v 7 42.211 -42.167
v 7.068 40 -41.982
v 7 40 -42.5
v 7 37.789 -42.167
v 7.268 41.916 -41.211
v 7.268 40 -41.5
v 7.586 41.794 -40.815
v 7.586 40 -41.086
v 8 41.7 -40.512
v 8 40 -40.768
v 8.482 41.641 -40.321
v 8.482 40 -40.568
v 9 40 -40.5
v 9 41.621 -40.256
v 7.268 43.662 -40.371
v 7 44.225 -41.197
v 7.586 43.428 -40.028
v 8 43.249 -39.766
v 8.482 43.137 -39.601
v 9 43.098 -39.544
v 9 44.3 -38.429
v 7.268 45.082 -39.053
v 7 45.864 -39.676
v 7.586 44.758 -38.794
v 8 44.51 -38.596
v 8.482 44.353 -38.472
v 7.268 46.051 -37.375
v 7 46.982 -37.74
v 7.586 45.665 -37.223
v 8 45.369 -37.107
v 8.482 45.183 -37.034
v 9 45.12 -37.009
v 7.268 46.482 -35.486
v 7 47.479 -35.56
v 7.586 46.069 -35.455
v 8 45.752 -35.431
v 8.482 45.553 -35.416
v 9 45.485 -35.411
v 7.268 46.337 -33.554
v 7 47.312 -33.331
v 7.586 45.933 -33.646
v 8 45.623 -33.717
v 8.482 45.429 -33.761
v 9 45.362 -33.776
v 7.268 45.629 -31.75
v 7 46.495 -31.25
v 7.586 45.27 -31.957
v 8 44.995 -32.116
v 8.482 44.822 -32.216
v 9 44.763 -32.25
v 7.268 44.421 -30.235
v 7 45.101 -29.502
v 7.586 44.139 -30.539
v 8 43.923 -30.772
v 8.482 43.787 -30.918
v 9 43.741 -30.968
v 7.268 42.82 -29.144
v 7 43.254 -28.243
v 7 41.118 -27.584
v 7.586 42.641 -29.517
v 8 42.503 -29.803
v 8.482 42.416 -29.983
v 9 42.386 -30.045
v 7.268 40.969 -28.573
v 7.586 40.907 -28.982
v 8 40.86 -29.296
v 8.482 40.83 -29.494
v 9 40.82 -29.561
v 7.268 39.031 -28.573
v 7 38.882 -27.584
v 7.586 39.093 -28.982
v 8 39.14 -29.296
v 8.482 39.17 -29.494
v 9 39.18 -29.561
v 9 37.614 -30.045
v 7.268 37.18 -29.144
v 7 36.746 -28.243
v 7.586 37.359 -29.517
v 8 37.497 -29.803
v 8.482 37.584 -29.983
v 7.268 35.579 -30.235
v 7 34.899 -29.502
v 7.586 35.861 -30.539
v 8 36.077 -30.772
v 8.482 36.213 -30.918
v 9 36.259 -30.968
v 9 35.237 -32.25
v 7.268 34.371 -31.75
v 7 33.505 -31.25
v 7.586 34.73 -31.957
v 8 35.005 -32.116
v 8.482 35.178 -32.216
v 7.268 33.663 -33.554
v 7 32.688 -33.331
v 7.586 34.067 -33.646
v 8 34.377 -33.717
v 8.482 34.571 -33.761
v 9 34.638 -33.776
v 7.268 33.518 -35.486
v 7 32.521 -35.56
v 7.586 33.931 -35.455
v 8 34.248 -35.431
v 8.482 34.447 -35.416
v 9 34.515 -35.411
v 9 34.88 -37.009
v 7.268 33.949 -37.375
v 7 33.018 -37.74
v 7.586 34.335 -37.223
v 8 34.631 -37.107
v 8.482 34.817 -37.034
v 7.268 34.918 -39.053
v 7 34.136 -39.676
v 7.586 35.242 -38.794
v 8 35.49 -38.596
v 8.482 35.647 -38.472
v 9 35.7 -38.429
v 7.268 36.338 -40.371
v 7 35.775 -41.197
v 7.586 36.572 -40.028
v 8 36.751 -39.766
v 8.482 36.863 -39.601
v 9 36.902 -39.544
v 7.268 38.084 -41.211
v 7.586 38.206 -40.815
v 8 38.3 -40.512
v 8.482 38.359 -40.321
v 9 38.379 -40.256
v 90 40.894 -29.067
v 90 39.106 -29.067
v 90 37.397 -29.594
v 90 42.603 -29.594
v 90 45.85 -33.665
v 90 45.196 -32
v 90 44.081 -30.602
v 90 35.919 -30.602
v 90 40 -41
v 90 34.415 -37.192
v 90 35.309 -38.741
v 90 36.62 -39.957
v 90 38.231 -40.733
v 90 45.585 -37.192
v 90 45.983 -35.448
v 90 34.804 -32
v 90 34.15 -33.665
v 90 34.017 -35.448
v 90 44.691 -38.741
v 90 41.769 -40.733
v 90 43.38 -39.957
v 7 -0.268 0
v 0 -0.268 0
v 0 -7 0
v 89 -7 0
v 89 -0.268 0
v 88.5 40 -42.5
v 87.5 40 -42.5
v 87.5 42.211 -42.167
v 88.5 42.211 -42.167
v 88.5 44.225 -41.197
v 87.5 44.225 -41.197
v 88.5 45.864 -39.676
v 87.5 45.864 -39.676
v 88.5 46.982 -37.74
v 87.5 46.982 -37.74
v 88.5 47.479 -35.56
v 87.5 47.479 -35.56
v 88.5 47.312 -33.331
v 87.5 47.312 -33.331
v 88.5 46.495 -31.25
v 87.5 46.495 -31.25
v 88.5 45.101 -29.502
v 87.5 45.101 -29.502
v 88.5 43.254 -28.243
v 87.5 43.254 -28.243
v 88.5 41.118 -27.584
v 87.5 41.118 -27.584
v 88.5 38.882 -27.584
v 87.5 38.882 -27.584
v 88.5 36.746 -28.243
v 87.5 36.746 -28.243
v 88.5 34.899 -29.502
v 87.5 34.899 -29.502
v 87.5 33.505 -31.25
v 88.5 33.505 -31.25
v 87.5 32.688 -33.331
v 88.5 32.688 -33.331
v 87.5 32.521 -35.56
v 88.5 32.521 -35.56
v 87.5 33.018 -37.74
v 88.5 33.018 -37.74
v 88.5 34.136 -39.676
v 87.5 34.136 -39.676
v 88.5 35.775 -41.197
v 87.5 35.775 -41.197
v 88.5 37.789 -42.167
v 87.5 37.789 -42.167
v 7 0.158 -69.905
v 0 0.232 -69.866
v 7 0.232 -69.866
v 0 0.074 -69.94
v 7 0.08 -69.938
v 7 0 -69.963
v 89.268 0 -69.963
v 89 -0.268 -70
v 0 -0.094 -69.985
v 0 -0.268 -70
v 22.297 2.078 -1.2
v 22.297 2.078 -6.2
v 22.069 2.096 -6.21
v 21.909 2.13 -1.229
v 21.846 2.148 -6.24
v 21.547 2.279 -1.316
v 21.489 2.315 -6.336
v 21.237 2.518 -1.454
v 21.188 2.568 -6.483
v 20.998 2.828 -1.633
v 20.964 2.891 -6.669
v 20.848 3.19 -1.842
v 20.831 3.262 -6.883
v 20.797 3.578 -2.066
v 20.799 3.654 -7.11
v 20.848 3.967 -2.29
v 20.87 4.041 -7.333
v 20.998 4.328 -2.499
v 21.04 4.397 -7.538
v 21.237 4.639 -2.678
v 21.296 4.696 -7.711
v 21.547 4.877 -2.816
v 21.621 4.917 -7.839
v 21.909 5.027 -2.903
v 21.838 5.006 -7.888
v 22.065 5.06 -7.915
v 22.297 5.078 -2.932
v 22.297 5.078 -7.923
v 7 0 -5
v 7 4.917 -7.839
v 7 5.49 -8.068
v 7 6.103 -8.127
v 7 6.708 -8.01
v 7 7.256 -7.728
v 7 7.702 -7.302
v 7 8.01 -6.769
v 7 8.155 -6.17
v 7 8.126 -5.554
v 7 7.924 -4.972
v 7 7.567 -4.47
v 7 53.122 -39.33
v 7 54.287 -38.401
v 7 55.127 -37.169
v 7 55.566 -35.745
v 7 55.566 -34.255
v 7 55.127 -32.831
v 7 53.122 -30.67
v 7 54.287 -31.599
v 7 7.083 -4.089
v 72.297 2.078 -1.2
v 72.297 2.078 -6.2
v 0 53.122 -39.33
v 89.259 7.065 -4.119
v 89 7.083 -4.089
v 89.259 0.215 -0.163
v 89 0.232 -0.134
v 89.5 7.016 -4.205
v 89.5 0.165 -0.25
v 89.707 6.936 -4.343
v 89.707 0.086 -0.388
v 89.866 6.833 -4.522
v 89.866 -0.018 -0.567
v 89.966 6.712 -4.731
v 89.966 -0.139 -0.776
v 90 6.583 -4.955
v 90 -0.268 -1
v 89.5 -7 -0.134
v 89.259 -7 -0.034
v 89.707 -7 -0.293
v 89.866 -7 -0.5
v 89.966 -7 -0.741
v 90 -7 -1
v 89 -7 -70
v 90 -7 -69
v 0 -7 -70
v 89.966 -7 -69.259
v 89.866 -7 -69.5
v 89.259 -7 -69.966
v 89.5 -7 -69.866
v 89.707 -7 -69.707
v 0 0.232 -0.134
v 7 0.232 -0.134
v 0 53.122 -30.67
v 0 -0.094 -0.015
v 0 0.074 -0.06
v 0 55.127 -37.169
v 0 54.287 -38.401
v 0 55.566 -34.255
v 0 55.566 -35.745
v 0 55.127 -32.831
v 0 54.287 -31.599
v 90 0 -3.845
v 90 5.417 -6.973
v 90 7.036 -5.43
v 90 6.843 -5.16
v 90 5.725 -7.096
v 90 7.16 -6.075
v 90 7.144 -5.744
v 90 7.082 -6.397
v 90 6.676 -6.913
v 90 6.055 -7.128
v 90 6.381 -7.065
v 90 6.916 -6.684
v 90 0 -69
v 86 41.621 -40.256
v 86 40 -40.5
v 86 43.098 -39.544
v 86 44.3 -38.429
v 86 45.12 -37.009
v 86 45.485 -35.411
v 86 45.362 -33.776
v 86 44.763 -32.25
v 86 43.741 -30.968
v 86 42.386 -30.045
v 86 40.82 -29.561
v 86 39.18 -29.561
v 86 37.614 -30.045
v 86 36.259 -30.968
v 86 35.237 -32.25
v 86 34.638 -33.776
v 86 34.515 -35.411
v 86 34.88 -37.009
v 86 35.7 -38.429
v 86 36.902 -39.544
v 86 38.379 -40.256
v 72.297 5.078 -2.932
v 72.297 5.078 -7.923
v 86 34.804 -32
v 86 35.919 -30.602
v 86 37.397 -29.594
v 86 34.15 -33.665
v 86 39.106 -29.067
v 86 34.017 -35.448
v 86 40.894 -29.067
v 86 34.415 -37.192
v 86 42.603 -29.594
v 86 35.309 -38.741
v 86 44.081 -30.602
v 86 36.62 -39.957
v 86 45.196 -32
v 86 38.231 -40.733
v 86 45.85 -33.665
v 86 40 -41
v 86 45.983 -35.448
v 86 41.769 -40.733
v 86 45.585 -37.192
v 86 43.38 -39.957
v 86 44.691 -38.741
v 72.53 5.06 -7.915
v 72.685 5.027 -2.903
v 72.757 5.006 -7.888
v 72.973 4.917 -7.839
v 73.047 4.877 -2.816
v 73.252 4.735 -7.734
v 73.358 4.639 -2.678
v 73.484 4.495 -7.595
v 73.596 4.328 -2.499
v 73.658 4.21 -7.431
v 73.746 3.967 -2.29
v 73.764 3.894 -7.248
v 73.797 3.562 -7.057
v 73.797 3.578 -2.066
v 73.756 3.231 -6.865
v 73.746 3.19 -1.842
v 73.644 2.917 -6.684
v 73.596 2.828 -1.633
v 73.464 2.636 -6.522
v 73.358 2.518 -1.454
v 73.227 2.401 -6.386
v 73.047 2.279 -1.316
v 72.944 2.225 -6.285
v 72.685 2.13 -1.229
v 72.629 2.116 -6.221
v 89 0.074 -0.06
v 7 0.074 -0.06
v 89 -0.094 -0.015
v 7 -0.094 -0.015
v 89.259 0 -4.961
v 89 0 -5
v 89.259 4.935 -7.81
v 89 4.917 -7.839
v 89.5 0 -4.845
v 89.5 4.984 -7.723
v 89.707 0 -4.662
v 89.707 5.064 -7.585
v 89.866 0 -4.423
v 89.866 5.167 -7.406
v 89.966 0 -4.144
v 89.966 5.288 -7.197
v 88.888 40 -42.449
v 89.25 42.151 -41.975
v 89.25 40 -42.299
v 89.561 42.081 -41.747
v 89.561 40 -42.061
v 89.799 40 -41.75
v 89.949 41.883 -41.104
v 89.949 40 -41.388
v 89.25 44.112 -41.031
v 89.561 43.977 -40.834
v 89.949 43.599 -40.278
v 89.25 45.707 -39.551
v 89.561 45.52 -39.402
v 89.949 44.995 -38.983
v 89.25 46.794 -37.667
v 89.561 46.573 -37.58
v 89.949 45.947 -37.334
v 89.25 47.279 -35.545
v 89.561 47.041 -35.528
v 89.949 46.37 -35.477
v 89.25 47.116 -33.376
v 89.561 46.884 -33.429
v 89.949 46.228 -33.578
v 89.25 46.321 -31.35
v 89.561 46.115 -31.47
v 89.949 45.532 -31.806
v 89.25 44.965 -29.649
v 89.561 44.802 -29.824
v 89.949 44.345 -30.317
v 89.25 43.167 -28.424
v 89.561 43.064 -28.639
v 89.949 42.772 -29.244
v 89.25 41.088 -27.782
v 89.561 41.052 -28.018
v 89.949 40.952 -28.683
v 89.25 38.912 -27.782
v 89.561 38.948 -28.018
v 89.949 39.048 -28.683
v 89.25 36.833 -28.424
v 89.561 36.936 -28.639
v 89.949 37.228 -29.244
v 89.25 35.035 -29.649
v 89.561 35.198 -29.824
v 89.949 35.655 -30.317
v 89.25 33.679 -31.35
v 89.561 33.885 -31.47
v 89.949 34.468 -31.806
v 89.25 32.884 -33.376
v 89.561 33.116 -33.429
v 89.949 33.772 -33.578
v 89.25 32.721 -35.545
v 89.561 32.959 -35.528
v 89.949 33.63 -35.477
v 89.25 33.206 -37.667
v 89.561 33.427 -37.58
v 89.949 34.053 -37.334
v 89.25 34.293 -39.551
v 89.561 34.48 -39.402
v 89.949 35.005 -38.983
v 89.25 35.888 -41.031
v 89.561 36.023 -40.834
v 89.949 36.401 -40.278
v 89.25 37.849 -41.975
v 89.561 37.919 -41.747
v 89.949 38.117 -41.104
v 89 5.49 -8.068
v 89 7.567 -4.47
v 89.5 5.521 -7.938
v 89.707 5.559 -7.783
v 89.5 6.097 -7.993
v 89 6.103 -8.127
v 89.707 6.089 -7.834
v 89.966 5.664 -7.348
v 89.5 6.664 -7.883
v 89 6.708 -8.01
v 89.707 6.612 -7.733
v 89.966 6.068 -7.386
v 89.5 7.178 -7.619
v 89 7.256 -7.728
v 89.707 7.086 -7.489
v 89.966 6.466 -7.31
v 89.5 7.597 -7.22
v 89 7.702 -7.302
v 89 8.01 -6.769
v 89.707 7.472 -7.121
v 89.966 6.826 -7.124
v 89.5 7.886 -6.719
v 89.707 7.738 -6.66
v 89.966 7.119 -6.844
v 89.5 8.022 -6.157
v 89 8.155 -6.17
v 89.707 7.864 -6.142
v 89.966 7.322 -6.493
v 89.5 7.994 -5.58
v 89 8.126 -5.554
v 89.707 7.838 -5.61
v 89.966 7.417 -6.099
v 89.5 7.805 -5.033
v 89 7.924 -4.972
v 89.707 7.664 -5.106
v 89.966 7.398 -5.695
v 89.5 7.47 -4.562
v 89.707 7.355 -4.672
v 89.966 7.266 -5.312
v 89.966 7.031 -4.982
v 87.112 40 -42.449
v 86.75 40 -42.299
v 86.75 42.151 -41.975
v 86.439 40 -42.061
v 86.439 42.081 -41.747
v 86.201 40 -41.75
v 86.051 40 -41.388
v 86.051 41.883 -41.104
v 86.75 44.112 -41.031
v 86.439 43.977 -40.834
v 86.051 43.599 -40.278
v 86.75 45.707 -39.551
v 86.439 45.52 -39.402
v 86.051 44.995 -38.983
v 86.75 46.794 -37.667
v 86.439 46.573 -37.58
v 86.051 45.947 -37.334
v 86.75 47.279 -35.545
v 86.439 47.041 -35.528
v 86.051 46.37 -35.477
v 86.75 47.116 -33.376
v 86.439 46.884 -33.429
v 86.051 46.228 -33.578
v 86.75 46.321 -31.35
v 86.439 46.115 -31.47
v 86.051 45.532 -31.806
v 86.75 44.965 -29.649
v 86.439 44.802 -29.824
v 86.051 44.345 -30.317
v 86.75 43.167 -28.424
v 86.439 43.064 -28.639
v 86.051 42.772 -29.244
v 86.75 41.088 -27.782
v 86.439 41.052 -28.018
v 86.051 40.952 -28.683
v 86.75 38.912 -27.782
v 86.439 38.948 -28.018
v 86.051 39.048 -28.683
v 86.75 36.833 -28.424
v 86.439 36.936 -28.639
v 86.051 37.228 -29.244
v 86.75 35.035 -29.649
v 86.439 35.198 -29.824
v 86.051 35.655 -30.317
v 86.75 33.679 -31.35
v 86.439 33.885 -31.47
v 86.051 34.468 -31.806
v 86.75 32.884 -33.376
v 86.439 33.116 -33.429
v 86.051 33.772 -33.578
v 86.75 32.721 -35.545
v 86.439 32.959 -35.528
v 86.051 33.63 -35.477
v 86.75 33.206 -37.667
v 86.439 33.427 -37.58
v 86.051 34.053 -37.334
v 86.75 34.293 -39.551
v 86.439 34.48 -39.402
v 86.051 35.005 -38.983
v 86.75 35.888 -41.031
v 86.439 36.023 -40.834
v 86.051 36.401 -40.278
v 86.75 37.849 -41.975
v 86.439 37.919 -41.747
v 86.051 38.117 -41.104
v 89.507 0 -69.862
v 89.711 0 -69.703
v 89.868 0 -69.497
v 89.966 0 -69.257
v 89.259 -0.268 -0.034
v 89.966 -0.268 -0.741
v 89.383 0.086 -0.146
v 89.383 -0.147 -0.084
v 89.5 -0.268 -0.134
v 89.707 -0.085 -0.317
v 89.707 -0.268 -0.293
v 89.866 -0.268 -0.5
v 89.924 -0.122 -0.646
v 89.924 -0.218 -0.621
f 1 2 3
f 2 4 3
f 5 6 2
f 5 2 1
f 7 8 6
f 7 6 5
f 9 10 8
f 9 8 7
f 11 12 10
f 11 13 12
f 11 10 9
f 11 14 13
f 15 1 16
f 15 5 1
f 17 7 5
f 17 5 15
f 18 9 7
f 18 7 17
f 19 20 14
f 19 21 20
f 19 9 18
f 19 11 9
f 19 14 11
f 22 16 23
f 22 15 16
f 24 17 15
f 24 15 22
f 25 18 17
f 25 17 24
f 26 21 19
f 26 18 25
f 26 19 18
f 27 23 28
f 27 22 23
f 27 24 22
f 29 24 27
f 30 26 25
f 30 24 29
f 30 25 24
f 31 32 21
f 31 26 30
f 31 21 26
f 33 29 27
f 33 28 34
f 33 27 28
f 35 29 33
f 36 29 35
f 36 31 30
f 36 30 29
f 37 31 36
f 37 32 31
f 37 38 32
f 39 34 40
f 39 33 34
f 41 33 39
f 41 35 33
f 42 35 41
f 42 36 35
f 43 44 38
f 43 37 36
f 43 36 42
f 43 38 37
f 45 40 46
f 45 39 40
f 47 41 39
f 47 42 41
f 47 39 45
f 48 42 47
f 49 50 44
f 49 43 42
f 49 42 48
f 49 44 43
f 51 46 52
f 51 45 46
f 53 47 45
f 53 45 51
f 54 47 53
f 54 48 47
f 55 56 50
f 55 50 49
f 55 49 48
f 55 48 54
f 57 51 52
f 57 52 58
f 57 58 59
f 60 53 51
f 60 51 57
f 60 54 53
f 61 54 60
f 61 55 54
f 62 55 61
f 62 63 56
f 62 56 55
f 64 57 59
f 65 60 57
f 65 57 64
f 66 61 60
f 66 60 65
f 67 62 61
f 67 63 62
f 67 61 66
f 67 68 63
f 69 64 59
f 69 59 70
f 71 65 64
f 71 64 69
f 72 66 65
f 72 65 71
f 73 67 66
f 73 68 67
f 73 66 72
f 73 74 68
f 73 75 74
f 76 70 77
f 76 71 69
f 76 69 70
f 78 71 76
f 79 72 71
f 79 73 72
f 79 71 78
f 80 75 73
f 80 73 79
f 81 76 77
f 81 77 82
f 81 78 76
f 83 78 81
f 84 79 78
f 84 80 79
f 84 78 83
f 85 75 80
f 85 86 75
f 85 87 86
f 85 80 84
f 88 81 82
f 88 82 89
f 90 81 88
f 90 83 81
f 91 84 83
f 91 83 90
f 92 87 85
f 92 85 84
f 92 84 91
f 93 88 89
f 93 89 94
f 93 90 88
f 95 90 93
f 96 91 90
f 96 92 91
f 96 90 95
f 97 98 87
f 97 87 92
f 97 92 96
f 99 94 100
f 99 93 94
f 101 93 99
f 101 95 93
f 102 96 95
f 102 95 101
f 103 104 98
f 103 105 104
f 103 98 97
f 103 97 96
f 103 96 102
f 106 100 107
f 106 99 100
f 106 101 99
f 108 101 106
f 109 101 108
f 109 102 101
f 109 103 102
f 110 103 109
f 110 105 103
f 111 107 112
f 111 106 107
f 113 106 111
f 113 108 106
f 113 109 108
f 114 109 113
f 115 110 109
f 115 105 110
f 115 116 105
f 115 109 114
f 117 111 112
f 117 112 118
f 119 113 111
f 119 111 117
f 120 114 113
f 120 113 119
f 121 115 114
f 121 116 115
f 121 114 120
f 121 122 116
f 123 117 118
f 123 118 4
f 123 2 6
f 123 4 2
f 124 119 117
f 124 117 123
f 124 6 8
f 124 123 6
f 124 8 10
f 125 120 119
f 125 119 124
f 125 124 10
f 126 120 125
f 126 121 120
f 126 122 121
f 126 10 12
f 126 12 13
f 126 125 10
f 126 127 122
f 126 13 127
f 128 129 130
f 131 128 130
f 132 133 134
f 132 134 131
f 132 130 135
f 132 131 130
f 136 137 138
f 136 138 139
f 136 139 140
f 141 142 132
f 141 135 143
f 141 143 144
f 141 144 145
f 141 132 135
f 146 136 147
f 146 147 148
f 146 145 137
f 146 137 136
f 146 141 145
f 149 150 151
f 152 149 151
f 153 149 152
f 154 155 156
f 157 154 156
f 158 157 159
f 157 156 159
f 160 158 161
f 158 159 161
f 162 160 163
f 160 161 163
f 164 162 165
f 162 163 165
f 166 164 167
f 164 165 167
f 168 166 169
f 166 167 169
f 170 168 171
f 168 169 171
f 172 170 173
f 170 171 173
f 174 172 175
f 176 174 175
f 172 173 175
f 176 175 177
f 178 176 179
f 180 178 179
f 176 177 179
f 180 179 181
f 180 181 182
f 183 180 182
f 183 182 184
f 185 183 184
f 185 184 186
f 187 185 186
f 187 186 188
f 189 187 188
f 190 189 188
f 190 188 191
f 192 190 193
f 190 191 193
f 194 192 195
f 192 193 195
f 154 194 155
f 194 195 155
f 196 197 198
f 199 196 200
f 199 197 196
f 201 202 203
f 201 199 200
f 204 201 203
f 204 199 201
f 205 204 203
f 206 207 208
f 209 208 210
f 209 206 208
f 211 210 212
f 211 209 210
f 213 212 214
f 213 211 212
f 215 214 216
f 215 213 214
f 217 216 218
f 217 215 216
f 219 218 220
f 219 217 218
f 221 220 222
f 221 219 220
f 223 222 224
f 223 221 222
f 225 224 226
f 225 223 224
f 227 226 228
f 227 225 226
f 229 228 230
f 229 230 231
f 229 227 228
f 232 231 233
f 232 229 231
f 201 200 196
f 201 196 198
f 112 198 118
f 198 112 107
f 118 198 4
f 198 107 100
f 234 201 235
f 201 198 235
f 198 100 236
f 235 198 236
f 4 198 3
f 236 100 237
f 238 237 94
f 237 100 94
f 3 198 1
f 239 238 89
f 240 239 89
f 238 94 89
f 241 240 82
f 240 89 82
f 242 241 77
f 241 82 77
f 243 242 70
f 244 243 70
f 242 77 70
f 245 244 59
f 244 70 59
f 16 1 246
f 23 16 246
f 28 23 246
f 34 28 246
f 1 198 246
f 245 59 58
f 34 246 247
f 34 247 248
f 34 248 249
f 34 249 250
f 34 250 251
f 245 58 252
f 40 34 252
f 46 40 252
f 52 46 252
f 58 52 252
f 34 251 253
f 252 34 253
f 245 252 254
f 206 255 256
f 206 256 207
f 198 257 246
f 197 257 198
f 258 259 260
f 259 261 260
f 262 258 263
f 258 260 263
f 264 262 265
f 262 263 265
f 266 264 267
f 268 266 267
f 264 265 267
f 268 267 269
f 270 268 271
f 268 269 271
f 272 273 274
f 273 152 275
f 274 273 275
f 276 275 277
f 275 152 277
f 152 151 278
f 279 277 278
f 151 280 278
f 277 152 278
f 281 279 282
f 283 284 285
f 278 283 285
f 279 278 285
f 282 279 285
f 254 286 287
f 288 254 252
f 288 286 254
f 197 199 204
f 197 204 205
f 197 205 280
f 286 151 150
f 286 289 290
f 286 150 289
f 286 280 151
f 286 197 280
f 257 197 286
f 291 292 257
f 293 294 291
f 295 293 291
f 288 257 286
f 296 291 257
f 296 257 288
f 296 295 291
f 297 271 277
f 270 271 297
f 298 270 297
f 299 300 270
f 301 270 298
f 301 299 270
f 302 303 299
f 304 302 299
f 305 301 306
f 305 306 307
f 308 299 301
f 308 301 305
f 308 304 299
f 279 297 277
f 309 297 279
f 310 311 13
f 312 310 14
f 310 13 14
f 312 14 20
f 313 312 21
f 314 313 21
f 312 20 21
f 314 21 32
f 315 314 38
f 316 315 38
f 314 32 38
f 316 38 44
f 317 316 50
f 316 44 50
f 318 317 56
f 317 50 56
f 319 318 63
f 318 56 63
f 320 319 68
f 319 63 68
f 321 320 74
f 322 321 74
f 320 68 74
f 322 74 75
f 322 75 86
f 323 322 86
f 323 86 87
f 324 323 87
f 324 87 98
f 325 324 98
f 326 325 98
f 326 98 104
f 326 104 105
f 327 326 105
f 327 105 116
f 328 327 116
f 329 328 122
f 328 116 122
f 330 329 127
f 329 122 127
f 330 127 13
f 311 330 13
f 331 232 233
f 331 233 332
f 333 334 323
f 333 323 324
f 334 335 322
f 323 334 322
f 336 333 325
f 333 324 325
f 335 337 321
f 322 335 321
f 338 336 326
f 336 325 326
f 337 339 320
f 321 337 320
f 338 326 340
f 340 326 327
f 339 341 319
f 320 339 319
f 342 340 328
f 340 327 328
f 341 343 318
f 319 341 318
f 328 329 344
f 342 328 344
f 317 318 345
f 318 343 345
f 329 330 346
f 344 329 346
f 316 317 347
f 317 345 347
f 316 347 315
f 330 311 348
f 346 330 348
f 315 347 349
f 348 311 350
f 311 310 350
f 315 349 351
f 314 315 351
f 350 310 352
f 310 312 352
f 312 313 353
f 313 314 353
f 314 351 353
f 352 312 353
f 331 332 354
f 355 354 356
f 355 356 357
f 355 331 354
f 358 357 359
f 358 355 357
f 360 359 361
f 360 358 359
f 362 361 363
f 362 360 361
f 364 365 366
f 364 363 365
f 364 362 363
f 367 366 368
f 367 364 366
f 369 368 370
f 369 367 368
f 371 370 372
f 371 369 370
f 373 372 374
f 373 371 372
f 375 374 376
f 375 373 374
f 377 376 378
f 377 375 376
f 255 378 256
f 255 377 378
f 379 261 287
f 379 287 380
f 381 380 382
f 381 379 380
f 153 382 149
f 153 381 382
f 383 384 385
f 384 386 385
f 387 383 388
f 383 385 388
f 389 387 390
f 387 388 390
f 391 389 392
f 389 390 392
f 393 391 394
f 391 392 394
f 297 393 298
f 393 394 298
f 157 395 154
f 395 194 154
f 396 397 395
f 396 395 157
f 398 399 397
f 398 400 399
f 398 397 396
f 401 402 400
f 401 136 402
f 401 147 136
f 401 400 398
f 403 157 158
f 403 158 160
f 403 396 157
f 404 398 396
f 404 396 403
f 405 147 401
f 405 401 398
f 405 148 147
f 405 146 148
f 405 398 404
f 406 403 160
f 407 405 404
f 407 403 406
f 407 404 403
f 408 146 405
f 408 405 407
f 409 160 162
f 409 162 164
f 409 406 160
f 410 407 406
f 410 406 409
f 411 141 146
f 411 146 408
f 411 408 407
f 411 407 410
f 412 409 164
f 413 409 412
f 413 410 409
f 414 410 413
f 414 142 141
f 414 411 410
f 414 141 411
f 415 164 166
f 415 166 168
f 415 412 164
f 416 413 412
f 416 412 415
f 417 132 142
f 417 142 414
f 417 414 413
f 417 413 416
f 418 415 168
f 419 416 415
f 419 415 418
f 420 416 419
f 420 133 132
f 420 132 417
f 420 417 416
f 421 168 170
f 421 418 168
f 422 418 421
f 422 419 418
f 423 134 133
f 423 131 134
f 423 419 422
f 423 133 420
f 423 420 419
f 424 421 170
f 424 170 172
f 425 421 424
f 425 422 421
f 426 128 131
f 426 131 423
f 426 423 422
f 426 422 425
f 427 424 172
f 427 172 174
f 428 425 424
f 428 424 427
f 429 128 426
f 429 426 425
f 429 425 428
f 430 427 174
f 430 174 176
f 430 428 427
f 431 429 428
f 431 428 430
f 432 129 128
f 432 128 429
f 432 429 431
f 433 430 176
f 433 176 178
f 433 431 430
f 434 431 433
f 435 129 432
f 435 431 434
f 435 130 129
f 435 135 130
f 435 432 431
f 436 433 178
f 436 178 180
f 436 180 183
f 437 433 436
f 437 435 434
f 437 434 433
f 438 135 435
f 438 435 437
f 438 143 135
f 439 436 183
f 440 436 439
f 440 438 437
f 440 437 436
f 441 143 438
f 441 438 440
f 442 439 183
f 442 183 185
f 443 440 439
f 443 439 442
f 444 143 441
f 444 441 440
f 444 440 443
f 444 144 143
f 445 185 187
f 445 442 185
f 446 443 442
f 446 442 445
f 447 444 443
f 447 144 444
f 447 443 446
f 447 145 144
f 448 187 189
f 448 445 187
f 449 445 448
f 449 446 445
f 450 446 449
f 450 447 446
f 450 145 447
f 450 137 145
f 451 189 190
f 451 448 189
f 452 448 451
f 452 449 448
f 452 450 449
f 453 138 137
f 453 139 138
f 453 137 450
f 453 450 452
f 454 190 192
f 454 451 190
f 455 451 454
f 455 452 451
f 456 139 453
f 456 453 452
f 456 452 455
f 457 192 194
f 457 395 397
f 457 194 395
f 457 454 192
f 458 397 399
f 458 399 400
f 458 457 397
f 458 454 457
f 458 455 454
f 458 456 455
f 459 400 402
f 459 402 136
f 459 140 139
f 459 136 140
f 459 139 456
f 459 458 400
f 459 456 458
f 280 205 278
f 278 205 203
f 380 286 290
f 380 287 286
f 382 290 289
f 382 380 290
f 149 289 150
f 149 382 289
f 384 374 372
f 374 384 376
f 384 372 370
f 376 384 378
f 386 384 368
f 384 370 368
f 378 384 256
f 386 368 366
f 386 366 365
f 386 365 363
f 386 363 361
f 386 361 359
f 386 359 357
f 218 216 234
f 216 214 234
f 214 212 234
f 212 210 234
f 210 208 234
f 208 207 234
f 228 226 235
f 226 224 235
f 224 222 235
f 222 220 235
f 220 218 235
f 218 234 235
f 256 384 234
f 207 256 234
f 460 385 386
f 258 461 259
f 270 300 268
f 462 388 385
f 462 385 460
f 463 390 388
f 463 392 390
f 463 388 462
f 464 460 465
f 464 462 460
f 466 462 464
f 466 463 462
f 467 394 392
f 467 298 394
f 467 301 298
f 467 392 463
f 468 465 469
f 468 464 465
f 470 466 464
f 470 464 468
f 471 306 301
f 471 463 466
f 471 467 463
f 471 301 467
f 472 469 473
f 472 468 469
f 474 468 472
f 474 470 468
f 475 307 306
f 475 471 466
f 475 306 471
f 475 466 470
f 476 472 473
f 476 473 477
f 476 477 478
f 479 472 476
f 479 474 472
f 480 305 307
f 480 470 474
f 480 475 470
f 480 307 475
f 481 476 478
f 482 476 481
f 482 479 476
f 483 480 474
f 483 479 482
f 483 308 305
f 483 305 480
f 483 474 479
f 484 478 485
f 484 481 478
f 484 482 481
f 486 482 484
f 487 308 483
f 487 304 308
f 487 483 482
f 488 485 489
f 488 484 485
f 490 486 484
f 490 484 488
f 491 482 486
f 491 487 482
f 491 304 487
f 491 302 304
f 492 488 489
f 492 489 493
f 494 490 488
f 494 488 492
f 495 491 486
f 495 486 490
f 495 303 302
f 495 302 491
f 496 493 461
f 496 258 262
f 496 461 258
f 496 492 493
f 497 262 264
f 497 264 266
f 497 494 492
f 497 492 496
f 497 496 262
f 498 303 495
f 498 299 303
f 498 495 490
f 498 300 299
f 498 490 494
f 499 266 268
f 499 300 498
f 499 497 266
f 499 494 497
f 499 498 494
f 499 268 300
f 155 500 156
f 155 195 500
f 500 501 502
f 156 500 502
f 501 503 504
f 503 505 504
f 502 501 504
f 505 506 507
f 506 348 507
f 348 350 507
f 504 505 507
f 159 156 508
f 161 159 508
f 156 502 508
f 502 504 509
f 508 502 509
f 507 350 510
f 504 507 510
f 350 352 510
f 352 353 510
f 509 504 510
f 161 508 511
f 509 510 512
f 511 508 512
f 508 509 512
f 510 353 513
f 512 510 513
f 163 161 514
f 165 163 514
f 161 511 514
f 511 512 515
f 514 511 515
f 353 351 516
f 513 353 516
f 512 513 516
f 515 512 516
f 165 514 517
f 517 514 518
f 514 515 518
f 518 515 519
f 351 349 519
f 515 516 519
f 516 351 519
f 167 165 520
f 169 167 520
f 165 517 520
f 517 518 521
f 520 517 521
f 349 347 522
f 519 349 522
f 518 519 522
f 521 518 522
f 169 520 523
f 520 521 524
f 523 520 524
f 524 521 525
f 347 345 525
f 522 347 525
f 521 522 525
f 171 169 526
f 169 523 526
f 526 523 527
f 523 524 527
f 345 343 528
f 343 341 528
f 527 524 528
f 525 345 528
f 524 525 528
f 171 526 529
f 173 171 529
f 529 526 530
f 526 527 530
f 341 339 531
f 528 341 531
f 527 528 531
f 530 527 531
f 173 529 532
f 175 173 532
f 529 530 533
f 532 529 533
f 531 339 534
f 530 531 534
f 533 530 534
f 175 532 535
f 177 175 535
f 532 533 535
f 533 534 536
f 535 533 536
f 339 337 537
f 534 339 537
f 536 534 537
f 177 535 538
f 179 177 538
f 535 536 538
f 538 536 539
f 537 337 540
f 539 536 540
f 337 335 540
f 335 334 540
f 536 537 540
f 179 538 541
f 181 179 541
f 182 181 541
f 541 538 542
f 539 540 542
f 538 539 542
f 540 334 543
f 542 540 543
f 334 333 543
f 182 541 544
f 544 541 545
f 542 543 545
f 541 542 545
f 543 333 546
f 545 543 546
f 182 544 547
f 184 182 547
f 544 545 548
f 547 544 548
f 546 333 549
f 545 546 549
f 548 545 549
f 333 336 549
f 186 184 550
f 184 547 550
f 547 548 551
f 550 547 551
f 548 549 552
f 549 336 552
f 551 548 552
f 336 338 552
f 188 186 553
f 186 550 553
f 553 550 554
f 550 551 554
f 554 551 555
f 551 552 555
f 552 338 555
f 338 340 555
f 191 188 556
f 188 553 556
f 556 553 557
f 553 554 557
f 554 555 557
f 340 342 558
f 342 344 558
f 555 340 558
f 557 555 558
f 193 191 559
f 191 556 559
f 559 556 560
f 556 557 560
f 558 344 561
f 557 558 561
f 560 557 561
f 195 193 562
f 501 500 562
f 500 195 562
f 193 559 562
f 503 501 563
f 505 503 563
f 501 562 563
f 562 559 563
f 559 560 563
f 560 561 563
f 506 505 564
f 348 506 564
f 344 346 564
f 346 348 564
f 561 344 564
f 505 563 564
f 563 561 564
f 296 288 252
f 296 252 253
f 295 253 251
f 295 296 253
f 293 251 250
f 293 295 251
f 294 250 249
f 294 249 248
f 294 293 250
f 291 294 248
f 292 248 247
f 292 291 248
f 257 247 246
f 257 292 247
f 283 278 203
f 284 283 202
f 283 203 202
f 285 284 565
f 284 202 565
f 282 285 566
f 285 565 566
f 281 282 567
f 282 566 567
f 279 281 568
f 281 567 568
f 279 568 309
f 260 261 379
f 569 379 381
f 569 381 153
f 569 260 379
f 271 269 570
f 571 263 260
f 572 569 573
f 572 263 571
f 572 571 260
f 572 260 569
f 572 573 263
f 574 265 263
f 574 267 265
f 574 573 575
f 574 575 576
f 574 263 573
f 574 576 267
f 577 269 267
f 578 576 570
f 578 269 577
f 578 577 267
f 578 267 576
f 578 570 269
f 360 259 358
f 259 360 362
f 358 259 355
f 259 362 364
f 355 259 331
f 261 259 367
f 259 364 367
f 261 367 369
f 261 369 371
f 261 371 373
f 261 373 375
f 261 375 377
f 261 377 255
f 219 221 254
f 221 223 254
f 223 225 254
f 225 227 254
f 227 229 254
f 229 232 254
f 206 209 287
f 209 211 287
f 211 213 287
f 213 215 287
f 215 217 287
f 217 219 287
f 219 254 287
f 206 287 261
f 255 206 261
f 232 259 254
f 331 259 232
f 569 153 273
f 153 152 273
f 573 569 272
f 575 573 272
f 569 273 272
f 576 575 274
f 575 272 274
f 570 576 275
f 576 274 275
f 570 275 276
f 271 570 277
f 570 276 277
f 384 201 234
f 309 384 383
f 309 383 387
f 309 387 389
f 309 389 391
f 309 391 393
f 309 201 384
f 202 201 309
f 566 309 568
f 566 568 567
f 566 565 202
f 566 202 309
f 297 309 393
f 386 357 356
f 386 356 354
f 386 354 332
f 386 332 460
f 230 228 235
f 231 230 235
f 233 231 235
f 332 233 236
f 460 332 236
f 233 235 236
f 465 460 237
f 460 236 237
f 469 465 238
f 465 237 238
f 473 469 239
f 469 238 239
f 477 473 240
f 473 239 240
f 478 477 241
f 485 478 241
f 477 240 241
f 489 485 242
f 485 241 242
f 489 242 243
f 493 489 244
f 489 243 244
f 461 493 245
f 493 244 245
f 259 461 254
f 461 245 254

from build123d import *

# Parameters (mm, degrees)
SKETCH_2_W          = 90
SKETCH_2_H          = 70
EXTRUDE_1_DEPTH     = 7
EXTRUDE_4_DEPTH     = 7
SKETCH_9_R          = 5.5
EXTRUDE_5_DEPTH     = 79
EXTRUDE_START       = 79
SKETCH_10_R         = 7.5
EXTRUDE_6_DEPTH     = 4
EXTRUDE_7_DEPTH     = 83
CUT_EXTRUDE_1_DEPTH = 10
FILLET_START        = -1
FILLET_1_DEPTH      = 92
FILLET_2_R          = 1
FILLET_3_R          = 1.5
FILLET_4_R          = 1.5
FILLET_9_R          = 1
FILLET_10_R         = 1
FILLET_12_R         = 2


with BuildPart() as part:
    # 草图2 → 凸台-拉伸1 (new body)
    with BuildSketch(Plane(origin=(0, 0, 0), x_dir=(1, 0, 0), z_dir=(0, 1, 0))):
        with Locations((45, 35)):
            Rectangle(SKETCH_2_W, SKETCH_2_H)
    extrude(amount=-EXTRUDE_1_DEPTH)



with BuildPart() as body_2:
    # 草图4 → 凸台-拉伸4 (new body)
    with BuildSketch(Plane(origin=(0, 0, 0), x_dir=(0, 0, -1), z_dir=(1, 0, 0))):
        with BuildLine():
            Line((0, 0), (30.669872981, 53.121778265))
            ThreePointArc((30.669872981, 53.121778265), (35, 55.621778265), (39.330127019, 53.121778265))
            Line((39.330127019, 53.121778265), (70, 0))
            Line((70, 0), (0, 0))
        make_face()
    extrude(amount=EXTRUDE_4_DEPTH)

    # 草图9 → 凸台-拉伸5 (add)
    with BuildSketch(Plane(origin=(7, 0, 0), x_dir=(0, 0, -1), z_dir=(1, 0, 0))):
        with Locations((35, 40)):
            Circle(SKETCH_9_R)
    extrude(amount=EXTRUDE_5_DEPTH)

    # 草图10 → 凸台-拉伸6 (add)
    with BuildSketch(Plane(origin=(7, 0, 0), x_dir=(0, 0, -1), z_dir=(1, 0, 0)).offset(EXTRUDE_START)):
        with Locations((35, 40)):
            Circle(SKETCH_10_R)
    extrude(amount=EXTRUDE_6_DEPTH)


with BuildPart() as part_1:
    add(part.part)

    add(body_2.part)  # 凸台-拉伸7 merges body 2
    # 草图11 → 凸台-拉伸7 (add)
    with BuildSketch(Plane(origin=(7, 0, 0), x_dir=(0, 0, -1), z_dir=(1, 0, 0))):
        with BuildLine():
            Line((4.089101615, 7.082531755), (0, 0))
            Line((0, 0), (5, 0))
            Line((5, 0), (7.839101615, 4.917468245))
            ThreePointArc((7.839101615, 4.917468245), (7.04663337, 7.875), (4.089101615, 7.082531755))
        make_face()
    extrude(amount=EXTRUDE_7_DEPTH)

    # 草图13 → 切除-拉伸1 (cut)
    with BuildSketch(Plane.XY):
        with BuildLine():
            Line((22.297230248, 5.078430518), (72.297230248, 5.078430518))
            ThreePointArc((72.297230248, 5.078430518), (73.797230248, 3.578430518), (72.297230248, 2.078430518))
            Line((72.297230248, 2.078430518), (22.297230248, 2.078430518))
            ThreePointArc((22.297230248, 2.078430518), (20.797230248, 3.578430518), (22.297230248, 5.078430518))
        make_face()
    extrude(amount=-CUT_EXTRUDE_1_DEPTH, mode=Mode.SUBTRACT)

    # 圆角1: read off the stored shape, not the designer's step
    # 圆角1 outline → 圆角1 (cut)
    with BuildSketch(Plane.YZ.offset(FILLET_START)):
        with BuildLine():
            Line((0, -70), (0.232050808, -69.866025404))
            ThreePointArc((0.232050808, -69.866025404), (-0.009130147, -69.965925826), (-0.267949192, -70))
            Line((-0.267949192, -70), (0, -70))
        make_face()
    extrude(amount=FILLET_1_DEPTH, mode=Mode.SUBTRACT)

    # 圆角2
    fillet_2_edges = [part_1.edges().sort_by_distance(p)[0] for p in [
        (45, 0, 0),
    ]]
    fillet(fillet_2_edges, radius=FILLET_2_R)

    # 圆角3
    fillet_3_edges = [part_1.edges().sort_by_distance(p)[0] for p in [
        (90, 40, -27.5),
    ]]
    fillet(fillet_3_edges, radius=FILLET_3_R)

    # 圆角4
    fillet_4_edges = [part_1.edges().sort_by_distance(p)[0] for p in [
        (86, 40, -27.5),
    ]]
    fillet(fillet_4_edges, radius=FILLET_4_R)

    # 圆角9
    fillet_9_edges = [part_1.edges().sort_by_distance(p)[0] for p in [
        (90, 2.458734123, -6.419550808),
        (90, 3.657291281, -2.111538106),
        (90, 7.875, -7.04663337),
        (90, -3.633974596, 0),
        (90, -0.009130147, -0.034074174),
    ]]
    fillet(fillet_9_edges, radius=FILLET_9_R)

    # 圆角10
    # the kernel refuses this fillet: 1 mm, written as the material it takes off along each edge
    with BuildSketch(Plane(origin=(90, 2.232050808, -70), x_dir=(0, 0, 1), z_dir=(0, -1, 0))) as fillet_10_piece_1:
        with BuildLine():
            CenterArc((FILLET_10_R, FILLET_10_R), FILLET_10_R, 180, 90)
            Line((0, FILLET_10_R), (0, 0))
            Line((0, 0), (FILLET_10_R, 0))
        make_face()
    extrude(amount=11.732050808, mode=Mode.SUBTRACT)

    # 圆角12
    fillet_12_edges = [part_1.edges().sort_by_distance(p)[0] for p in [
        (7, 40, -29.5),
    ]]
    fillet(fillet_12_edges, radius=FILLET_12_R)


solid = part_1.part
